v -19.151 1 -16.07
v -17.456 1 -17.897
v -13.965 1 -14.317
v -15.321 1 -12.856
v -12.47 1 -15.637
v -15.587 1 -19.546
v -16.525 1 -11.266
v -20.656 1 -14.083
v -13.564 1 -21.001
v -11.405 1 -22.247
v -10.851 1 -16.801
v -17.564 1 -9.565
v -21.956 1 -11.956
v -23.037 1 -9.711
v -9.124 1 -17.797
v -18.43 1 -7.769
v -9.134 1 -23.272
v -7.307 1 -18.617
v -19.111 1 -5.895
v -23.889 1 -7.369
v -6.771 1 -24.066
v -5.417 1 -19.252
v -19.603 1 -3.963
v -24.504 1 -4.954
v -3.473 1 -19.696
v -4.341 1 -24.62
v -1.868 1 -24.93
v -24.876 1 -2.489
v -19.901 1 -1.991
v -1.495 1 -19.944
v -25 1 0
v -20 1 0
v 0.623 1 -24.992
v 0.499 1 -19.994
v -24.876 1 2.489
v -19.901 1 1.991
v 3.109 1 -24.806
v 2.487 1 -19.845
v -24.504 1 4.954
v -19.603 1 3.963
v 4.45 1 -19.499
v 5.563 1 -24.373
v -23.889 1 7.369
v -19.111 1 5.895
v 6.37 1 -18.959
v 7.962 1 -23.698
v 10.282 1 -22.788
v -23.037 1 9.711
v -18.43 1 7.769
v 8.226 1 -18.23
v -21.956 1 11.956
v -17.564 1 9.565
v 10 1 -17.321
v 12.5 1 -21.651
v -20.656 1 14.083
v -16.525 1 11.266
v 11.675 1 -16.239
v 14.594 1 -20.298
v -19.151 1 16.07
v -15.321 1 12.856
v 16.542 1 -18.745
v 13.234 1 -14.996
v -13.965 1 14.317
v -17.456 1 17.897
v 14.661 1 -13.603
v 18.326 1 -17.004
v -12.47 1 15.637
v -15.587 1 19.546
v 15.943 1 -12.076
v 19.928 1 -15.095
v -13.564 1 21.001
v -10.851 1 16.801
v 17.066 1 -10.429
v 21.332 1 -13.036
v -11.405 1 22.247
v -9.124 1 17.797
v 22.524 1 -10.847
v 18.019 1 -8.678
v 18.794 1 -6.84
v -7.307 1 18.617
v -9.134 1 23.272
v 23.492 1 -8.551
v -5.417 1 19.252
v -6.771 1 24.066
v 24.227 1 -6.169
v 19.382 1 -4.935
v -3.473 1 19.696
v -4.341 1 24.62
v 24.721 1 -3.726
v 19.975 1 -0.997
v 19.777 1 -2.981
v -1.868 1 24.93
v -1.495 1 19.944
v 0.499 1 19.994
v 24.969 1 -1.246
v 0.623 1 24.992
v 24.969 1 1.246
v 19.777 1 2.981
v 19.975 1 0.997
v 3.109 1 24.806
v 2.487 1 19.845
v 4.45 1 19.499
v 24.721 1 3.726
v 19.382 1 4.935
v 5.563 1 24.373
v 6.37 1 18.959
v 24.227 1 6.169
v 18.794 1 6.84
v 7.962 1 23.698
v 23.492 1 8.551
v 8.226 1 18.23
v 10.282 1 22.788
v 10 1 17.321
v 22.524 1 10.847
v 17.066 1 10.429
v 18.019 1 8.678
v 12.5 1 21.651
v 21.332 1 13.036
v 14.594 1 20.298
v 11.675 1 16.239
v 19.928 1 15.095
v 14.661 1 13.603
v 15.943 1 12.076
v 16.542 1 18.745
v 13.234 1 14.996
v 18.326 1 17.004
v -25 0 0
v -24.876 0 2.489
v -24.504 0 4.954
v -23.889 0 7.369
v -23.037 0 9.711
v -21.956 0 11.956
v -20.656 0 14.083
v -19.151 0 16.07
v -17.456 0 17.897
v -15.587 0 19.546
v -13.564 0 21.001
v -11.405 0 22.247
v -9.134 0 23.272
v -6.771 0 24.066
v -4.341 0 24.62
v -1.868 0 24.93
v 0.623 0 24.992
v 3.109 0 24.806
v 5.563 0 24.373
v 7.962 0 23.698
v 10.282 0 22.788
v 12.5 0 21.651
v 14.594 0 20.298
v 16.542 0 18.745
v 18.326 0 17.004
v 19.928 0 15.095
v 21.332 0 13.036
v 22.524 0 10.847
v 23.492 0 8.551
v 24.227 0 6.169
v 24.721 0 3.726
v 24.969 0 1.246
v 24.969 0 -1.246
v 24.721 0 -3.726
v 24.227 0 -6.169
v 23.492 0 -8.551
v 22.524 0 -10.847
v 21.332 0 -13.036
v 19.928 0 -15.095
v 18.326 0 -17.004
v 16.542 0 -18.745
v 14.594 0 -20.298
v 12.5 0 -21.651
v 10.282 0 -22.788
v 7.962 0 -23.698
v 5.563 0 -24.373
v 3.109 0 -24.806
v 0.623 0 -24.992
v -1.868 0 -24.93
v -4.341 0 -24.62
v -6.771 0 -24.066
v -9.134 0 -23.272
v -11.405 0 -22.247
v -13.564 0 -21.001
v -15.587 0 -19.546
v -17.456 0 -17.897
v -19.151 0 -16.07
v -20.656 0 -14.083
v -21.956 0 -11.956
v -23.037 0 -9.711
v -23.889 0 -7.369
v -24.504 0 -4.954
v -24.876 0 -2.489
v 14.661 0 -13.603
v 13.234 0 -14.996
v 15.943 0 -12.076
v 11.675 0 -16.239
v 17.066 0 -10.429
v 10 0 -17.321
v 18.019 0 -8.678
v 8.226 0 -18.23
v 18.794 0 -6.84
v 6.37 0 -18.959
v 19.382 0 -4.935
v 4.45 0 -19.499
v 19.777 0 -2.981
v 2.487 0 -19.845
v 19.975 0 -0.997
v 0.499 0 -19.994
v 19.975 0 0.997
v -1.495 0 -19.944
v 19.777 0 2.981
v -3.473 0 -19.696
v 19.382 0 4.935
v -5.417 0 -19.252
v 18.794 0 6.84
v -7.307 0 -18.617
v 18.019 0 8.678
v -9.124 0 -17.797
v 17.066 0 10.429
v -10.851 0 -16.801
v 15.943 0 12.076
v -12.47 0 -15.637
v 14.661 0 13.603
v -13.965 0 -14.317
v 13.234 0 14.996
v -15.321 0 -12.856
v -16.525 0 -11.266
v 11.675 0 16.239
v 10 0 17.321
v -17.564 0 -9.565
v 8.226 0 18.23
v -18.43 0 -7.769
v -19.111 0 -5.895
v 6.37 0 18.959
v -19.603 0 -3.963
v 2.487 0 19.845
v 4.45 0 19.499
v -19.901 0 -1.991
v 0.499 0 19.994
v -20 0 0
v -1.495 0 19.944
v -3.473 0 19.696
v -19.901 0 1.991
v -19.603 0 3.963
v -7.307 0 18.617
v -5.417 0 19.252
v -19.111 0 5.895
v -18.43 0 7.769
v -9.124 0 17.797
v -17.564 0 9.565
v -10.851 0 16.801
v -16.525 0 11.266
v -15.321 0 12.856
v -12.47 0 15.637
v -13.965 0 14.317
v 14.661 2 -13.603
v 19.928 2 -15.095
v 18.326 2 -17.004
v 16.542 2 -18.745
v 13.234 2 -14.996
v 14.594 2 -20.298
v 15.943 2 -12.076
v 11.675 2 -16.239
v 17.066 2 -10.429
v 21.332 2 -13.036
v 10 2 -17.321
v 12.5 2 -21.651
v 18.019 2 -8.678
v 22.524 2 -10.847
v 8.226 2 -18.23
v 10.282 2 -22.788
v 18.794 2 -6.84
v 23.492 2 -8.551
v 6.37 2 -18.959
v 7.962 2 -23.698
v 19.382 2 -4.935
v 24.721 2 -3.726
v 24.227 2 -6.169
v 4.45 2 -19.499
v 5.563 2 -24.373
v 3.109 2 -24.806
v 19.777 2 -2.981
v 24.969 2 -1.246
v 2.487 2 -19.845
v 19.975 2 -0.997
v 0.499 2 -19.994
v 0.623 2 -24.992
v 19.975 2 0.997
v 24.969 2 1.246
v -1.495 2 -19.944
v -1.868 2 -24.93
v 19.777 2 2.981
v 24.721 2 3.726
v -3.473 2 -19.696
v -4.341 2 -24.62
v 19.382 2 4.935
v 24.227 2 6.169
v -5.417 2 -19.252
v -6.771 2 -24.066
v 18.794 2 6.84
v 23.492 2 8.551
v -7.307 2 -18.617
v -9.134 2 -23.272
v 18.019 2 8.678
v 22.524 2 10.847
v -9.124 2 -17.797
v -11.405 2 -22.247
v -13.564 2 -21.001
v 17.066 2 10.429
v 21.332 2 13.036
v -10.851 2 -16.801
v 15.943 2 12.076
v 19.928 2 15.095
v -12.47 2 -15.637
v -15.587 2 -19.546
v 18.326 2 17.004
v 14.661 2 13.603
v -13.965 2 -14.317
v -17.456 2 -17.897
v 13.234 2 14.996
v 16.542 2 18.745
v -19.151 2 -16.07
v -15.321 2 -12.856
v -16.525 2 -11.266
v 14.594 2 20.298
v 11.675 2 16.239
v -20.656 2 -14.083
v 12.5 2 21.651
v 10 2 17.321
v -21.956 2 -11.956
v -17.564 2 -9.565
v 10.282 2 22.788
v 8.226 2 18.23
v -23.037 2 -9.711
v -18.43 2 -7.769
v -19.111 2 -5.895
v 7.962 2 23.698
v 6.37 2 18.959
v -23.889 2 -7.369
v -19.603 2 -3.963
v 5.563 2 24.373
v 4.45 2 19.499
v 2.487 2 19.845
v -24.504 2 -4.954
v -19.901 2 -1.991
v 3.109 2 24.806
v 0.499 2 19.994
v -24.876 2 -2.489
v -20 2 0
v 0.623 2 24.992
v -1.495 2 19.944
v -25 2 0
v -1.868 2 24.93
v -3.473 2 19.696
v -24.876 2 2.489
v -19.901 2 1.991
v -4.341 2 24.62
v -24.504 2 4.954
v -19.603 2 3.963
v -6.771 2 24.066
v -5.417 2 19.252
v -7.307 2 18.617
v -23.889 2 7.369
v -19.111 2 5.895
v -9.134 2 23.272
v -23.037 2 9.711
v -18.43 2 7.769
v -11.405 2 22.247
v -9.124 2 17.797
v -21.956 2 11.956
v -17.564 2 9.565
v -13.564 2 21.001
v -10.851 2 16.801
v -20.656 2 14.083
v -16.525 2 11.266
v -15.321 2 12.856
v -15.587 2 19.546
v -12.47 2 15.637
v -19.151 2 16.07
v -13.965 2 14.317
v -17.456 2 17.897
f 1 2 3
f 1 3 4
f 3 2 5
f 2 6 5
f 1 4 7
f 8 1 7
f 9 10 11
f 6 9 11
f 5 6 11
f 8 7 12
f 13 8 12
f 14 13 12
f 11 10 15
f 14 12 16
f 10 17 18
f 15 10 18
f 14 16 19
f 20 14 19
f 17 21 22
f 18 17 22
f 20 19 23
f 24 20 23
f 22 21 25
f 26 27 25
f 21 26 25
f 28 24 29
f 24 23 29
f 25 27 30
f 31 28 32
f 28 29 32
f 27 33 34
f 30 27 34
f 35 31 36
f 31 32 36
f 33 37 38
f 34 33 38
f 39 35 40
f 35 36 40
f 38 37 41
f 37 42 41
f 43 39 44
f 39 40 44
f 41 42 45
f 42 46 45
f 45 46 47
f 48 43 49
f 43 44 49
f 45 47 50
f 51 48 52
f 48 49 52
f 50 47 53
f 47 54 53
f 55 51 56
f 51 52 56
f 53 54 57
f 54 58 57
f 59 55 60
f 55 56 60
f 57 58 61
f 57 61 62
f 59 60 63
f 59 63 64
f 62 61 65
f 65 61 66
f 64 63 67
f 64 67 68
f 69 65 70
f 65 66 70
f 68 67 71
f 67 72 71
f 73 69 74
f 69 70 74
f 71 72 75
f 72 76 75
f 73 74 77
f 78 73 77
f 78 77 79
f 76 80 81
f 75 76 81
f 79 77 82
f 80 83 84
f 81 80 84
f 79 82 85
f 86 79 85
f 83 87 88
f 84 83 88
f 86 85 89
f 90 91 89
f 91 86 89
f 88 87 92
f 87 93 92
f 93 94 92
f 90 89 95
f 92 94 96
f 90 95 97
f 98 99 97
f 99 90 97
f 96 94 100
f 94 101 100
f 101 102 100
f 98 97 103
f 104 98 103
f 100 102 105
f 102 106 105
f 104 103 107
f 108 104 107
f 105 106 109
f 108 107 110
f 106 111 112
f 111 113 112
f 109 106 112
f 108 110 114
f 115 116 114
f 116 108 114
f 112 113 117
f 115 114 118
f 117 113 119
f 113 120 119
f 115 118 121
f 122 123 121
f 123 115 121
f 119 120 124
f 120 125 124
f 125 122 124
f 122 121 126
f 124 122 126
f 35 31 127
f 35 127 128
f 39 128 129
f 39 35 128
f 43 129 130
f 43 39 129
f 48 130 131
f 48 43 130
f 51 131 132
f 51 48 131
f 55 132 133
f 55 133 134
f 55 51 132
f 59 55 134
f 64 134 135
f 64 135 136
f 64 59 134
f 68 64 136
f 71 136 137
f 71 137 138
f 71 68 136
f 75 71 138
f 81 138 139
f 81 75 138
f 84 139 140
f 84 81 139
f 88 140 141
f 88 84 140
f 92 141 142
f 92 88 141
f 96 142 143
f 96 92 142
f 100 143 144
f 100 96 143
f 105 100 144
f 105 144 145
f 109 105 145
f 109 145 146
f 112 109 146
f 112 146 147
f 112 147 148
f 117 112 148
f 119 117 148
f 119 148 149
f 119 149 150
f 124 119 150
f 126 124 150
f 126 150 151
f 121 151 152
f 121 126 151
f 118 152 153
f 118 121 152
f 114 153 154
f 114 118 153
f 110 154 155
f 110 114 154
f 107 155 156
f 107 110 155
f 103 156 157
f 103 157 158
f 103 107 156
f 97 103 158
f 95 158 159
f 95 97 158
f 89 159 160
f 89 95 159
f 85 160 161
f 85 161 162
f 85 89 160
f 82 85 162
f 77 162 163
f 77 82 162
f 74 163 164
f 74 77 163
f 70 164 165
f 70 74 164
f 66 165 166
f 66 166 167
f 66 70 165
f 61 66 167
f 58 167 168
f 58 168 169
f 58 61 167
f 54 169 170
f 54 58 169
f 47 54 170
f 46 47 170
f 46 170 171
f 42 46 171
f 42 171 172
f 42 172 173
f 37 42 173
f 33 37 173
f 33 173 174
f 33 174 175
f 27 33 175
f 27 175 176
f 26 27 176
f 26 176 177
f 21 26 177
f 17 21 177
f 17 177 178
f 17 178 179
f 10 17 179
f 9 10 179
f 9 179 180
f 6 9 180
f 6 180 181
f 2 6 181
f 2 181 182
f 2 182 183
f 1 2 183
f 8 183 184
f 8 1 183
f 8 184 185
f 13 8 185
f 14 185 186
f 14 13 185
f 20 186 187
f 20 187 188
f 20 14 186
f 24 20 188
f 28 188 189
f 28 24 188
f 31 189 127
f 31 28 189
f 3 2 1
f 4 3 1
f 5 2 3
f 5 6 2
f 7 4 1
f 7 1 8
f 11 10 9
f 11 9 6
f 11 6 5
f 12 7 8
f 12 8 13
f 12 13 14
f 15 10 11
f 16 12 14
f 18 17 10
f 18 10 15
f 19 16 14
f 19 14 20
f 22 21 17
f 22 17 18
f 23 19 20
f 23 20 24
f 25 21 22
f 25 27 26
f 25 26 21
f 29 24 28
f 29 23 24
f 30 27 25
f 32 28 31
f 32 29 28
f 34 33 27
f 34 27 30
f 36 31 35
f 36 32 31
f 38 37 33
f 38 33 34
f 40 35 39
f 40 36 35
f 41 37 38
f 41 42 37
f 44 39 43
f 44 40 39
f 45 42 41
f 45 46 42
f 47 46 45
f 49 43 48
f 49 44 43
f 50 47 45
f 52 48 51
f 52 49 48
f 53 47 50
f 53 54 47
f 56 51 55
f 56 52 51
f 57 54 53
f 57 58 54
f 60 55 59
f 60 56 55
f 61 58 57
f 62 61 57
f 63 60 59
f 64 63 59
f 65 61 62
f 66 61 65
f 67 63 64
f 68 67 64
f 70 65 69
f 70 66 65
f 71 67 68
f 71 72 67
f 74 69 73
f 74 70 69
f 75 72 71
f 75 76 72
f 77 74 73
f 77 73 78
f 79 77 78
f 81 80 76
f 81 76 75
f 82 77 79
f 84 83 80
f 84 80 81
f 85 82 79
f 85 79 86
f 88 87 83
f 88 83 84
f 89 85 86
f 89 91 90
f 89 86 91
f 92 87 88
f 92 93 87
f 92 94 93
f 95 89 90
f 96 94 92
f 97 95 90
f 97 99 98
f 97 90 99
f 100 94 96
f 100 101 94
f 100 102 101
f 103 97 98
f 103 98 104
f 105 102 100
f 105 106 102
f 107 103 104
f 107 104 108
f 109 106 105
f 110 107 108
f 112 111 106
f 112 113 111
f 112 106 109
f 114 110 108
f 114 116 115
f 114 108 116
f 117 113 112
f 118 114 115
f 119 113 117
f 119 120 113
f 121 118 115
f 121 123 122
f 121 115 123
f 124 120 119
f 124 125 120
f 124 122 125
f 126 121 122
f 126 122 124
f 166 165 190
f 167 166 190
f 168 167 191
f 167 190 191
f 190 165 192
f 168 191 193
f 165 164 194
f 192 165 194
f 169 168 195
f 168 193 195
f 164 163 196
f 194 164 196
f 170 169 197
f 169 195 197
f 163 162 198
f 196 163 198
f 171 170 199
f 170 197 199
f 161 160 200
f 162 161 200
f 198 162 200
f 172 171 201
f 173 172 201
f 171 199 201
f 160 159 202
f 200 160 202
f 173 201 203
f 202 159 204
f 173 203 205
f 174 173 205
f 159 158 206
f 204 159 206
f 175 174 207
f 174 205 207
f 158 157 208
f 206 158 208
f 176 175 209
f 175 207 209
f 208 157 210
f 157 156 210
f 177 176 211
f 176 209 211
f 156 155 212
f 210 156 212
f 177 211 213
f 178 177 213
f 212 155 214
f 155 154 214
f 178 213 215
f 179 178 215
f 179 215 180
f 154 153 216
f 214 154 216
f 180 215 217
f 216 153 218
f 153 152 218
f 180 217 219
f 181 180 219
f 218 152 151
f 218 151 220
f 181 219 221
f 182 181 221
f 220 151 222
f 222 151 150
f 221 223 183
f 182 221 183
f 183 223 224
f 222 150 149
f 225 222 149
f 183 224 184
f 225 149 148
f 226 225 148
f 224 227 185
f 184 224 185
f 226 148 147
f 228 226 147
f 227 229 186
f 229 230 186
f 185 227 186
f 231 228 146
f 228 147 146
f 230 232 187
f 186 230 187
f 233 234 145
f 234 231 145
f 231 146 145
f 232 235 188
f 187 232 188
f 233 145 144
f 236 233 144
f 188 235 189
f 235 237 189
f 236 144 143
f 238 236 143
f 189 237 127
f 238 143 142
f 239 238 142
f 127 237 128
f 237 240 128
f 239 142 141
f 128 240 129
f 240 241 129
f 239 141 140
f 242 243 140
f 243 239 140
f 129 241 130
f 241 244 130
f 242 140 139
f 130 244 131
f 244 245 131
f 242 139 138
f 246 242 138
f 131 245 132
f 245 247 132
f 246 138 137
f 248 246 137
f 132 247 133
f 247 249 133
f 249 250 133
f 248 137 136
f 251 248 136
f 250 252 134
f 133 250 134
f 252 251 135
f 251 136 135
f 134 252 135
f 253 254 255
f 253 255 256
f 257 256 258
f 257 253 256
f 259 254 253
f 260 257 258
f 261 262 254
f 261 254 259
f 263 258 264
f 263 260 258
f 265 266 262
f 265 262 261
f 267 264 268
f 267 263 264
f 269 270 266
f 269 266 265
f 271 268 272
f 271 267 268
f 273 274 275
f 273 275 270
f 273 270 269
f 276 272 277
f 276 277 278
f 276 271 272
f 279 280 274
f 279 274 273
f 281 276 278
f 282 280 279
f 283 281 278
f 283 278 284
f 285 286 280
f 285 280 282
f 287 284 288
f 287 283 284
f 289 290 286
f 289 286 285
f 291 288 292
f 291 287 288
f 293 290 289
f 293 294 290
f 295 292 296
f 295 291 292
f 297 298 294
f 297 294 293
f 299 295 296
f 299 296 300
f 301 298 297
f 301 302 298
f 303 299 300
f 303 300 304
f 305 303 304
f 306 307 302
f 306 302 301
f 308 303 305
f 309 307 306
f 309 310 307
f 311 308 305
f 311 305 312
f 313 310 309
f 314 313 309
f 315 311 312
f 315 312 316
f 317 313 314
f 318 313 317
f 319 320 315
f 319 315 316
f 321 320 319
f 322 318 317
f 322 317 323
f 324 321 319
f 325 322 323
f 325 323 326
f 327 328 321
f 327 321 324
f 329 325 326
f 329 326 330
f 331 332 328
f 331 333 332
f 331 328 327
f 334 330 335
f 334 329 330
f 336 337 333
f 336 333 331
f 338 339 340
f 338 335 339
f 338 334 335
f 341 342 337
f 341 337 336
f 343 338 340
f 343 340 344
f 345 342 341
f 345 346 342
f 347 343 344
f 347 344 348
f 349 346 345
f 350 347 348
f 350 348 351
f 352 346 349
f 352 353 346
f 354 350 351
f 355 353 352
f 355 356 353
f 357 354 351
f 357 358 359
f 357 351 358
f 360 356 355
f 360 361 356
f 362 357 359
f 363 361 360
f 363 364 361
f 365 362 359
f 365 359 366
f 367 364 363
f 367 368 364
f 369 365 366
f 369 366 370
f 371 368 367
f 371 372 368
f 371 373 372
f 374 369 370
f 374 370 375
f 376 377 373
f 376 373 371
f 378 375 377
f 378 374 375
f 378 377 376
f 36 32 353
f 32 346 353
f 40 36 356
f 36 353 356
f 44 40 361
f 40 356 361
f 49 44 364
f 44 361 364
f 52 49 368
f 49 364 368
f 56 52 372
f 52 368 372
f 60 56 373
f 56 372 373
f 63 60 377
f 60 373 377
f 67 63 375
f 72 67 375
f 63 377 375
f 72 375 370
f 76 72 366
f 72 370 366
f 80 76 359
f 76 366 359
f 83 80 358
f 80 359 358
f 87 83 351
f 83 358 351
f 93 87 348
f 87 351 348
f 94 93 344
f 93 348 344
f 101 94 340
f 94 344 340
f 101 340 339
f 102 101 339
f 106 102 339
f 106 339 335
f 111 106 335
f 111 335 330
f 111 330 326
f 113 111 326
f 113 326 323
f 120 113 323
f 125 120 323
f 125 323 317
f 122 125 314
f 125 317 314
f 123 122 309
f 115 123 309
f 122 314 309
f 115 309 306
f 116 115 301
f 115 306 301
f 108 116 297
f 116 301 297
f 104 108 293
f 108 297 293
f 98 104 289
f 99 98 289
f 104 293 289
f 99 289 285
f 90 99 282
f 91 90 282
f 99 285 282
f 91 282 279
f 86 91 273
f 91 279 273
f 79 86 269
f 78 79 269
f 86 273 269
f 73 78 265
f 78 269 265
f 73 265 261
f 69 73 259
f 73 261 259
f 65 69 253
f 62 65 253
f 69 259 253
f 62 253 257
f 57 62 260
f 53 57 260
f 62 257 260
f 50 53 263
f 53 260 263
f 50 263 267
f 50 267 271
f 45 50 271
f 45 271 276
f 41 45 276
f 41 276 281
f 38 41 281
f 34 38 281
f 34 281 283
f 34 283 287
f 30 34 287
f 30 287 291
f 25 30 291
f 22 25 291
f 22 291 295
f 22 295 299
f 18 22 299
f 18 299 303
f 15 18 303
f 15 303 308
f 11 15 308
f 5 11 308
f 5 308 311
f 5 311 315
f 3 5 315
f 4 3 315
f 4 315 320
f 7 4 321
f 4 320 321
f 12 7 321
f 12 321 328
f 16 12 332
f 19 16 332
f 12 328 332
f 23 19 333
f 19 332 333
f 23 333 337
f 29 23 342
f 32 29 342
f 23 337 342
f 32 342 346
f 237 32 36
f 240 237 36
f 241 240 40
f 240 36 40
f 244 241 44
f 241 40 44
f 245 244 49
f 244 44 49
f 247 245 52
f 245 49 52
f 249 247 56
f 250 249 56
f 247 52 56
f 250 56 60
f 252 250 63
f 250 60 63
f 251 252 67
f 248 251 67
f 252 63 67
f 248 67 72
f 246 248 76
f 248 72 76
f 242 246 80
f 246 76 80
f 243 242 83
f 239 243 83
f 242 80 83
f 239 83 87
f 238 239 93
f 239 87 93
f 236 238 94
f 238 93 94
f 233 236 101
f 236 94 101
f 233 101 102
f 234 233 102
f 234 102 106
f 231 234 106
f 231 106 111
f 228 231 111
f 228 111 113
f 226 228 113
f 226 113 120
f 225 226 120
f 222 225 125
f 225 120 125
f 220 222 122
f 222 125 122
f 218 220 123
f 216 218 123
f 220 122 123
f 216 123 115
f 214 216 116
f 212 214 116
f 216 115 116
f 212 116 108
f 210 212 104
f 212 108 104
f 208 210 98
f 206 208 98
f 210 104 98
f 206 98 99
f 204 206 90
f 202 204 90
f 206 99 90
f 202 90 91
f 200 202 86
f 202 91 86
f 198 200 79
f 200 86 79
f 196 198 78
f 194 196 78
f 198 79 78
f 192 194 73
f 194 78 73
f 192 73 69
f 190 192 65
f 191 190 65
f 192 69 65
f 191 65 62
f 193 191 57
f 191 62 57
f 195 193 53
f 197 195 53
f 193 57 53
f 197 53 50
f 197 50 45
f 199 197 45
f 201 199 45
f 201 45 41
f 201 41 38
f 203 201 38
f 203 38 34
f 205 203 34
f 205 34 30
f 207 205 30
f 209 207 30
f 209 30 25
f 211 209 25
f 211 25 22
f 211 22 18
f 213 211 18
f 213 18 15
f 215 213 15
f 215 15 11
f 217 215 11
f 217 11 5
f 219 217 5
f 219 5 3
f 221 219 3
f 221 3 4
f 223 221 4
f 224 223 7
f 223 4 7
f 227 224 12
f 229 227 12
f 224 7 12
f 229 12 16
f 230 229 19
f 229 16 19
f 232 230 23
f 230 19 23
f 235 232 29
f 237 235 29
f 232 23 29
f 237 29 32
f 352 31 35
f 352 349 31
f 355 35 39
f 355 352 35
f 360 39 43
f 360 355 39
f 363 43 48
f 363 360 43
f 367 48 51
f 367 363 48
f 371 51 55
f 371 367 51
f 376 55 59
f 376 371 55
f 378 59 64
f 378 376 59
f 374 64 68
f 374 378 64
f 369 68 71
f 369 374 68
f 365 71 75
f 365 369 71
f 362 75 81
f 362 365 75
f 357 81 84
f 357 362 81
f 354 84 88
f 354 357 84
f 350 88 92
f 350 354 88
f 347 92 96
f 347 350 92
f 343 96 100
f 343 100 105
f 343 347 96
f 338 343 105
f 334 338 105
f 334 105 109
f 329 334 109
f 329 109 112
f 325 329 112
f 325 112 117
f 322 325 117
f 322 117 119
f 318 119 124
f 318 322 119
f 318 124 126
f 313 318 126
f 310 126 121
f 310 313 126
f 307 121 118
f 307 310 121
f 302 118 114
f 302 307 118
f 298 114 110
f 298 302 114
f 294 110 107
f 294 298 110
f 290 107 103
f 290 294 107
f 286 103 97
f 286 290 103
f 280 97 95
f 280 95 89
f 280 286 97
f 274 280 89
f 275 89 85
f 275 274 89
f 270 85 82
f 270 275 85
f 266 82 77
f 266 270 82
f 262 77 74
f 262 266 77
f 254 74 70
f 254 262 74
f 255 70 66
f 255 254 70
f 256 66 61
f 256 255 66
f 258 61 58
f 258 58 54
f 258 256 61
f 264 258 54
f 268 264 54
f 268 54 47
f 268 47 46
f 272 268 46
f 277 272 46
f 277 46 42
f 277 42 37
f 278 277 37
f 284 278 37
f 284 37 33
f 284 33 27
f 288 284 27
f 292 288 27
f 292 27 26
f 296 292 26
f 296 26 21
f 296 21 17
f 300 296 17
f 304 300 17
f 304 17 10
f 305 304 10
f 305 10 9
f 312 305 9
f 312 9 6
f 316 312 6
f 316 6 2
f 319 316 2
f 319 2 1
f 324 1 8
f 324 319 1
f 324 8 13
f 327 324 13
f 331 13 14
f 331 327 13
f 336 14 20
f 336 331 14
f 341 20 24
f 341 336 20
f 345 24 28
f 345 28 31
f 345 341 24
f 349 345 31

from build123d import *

# Parameters (mm, degrees)
SKETCH1_W = 5
SKETCH1_H = 2


with BuildPart() as part:
    # Sketch1 → Revolve1 (revolve)
    with BuildSketch(Plane.XY):
        with Locations((-22.5, 1)):
            Rectangle(SKETCH1_W, SKETCH1_H)
    revolve(axis=Axis((0, 0, 0), (0, 1, 0)))


with BuildPart() as body_2:
    # Split1: the piece on the far side of the plane
    add(part.part)
    split(bisect_by=Plane.ZX.offset(1), keep=Keep.BOTTOM)


with BuildPart() as part_1:
    add(part.part)

    # Split1
    split(bisect_by=Plane.ZX.offset(1), keep=Keep.TOP)


solid = Compound([body_2.part, part_1.part])
